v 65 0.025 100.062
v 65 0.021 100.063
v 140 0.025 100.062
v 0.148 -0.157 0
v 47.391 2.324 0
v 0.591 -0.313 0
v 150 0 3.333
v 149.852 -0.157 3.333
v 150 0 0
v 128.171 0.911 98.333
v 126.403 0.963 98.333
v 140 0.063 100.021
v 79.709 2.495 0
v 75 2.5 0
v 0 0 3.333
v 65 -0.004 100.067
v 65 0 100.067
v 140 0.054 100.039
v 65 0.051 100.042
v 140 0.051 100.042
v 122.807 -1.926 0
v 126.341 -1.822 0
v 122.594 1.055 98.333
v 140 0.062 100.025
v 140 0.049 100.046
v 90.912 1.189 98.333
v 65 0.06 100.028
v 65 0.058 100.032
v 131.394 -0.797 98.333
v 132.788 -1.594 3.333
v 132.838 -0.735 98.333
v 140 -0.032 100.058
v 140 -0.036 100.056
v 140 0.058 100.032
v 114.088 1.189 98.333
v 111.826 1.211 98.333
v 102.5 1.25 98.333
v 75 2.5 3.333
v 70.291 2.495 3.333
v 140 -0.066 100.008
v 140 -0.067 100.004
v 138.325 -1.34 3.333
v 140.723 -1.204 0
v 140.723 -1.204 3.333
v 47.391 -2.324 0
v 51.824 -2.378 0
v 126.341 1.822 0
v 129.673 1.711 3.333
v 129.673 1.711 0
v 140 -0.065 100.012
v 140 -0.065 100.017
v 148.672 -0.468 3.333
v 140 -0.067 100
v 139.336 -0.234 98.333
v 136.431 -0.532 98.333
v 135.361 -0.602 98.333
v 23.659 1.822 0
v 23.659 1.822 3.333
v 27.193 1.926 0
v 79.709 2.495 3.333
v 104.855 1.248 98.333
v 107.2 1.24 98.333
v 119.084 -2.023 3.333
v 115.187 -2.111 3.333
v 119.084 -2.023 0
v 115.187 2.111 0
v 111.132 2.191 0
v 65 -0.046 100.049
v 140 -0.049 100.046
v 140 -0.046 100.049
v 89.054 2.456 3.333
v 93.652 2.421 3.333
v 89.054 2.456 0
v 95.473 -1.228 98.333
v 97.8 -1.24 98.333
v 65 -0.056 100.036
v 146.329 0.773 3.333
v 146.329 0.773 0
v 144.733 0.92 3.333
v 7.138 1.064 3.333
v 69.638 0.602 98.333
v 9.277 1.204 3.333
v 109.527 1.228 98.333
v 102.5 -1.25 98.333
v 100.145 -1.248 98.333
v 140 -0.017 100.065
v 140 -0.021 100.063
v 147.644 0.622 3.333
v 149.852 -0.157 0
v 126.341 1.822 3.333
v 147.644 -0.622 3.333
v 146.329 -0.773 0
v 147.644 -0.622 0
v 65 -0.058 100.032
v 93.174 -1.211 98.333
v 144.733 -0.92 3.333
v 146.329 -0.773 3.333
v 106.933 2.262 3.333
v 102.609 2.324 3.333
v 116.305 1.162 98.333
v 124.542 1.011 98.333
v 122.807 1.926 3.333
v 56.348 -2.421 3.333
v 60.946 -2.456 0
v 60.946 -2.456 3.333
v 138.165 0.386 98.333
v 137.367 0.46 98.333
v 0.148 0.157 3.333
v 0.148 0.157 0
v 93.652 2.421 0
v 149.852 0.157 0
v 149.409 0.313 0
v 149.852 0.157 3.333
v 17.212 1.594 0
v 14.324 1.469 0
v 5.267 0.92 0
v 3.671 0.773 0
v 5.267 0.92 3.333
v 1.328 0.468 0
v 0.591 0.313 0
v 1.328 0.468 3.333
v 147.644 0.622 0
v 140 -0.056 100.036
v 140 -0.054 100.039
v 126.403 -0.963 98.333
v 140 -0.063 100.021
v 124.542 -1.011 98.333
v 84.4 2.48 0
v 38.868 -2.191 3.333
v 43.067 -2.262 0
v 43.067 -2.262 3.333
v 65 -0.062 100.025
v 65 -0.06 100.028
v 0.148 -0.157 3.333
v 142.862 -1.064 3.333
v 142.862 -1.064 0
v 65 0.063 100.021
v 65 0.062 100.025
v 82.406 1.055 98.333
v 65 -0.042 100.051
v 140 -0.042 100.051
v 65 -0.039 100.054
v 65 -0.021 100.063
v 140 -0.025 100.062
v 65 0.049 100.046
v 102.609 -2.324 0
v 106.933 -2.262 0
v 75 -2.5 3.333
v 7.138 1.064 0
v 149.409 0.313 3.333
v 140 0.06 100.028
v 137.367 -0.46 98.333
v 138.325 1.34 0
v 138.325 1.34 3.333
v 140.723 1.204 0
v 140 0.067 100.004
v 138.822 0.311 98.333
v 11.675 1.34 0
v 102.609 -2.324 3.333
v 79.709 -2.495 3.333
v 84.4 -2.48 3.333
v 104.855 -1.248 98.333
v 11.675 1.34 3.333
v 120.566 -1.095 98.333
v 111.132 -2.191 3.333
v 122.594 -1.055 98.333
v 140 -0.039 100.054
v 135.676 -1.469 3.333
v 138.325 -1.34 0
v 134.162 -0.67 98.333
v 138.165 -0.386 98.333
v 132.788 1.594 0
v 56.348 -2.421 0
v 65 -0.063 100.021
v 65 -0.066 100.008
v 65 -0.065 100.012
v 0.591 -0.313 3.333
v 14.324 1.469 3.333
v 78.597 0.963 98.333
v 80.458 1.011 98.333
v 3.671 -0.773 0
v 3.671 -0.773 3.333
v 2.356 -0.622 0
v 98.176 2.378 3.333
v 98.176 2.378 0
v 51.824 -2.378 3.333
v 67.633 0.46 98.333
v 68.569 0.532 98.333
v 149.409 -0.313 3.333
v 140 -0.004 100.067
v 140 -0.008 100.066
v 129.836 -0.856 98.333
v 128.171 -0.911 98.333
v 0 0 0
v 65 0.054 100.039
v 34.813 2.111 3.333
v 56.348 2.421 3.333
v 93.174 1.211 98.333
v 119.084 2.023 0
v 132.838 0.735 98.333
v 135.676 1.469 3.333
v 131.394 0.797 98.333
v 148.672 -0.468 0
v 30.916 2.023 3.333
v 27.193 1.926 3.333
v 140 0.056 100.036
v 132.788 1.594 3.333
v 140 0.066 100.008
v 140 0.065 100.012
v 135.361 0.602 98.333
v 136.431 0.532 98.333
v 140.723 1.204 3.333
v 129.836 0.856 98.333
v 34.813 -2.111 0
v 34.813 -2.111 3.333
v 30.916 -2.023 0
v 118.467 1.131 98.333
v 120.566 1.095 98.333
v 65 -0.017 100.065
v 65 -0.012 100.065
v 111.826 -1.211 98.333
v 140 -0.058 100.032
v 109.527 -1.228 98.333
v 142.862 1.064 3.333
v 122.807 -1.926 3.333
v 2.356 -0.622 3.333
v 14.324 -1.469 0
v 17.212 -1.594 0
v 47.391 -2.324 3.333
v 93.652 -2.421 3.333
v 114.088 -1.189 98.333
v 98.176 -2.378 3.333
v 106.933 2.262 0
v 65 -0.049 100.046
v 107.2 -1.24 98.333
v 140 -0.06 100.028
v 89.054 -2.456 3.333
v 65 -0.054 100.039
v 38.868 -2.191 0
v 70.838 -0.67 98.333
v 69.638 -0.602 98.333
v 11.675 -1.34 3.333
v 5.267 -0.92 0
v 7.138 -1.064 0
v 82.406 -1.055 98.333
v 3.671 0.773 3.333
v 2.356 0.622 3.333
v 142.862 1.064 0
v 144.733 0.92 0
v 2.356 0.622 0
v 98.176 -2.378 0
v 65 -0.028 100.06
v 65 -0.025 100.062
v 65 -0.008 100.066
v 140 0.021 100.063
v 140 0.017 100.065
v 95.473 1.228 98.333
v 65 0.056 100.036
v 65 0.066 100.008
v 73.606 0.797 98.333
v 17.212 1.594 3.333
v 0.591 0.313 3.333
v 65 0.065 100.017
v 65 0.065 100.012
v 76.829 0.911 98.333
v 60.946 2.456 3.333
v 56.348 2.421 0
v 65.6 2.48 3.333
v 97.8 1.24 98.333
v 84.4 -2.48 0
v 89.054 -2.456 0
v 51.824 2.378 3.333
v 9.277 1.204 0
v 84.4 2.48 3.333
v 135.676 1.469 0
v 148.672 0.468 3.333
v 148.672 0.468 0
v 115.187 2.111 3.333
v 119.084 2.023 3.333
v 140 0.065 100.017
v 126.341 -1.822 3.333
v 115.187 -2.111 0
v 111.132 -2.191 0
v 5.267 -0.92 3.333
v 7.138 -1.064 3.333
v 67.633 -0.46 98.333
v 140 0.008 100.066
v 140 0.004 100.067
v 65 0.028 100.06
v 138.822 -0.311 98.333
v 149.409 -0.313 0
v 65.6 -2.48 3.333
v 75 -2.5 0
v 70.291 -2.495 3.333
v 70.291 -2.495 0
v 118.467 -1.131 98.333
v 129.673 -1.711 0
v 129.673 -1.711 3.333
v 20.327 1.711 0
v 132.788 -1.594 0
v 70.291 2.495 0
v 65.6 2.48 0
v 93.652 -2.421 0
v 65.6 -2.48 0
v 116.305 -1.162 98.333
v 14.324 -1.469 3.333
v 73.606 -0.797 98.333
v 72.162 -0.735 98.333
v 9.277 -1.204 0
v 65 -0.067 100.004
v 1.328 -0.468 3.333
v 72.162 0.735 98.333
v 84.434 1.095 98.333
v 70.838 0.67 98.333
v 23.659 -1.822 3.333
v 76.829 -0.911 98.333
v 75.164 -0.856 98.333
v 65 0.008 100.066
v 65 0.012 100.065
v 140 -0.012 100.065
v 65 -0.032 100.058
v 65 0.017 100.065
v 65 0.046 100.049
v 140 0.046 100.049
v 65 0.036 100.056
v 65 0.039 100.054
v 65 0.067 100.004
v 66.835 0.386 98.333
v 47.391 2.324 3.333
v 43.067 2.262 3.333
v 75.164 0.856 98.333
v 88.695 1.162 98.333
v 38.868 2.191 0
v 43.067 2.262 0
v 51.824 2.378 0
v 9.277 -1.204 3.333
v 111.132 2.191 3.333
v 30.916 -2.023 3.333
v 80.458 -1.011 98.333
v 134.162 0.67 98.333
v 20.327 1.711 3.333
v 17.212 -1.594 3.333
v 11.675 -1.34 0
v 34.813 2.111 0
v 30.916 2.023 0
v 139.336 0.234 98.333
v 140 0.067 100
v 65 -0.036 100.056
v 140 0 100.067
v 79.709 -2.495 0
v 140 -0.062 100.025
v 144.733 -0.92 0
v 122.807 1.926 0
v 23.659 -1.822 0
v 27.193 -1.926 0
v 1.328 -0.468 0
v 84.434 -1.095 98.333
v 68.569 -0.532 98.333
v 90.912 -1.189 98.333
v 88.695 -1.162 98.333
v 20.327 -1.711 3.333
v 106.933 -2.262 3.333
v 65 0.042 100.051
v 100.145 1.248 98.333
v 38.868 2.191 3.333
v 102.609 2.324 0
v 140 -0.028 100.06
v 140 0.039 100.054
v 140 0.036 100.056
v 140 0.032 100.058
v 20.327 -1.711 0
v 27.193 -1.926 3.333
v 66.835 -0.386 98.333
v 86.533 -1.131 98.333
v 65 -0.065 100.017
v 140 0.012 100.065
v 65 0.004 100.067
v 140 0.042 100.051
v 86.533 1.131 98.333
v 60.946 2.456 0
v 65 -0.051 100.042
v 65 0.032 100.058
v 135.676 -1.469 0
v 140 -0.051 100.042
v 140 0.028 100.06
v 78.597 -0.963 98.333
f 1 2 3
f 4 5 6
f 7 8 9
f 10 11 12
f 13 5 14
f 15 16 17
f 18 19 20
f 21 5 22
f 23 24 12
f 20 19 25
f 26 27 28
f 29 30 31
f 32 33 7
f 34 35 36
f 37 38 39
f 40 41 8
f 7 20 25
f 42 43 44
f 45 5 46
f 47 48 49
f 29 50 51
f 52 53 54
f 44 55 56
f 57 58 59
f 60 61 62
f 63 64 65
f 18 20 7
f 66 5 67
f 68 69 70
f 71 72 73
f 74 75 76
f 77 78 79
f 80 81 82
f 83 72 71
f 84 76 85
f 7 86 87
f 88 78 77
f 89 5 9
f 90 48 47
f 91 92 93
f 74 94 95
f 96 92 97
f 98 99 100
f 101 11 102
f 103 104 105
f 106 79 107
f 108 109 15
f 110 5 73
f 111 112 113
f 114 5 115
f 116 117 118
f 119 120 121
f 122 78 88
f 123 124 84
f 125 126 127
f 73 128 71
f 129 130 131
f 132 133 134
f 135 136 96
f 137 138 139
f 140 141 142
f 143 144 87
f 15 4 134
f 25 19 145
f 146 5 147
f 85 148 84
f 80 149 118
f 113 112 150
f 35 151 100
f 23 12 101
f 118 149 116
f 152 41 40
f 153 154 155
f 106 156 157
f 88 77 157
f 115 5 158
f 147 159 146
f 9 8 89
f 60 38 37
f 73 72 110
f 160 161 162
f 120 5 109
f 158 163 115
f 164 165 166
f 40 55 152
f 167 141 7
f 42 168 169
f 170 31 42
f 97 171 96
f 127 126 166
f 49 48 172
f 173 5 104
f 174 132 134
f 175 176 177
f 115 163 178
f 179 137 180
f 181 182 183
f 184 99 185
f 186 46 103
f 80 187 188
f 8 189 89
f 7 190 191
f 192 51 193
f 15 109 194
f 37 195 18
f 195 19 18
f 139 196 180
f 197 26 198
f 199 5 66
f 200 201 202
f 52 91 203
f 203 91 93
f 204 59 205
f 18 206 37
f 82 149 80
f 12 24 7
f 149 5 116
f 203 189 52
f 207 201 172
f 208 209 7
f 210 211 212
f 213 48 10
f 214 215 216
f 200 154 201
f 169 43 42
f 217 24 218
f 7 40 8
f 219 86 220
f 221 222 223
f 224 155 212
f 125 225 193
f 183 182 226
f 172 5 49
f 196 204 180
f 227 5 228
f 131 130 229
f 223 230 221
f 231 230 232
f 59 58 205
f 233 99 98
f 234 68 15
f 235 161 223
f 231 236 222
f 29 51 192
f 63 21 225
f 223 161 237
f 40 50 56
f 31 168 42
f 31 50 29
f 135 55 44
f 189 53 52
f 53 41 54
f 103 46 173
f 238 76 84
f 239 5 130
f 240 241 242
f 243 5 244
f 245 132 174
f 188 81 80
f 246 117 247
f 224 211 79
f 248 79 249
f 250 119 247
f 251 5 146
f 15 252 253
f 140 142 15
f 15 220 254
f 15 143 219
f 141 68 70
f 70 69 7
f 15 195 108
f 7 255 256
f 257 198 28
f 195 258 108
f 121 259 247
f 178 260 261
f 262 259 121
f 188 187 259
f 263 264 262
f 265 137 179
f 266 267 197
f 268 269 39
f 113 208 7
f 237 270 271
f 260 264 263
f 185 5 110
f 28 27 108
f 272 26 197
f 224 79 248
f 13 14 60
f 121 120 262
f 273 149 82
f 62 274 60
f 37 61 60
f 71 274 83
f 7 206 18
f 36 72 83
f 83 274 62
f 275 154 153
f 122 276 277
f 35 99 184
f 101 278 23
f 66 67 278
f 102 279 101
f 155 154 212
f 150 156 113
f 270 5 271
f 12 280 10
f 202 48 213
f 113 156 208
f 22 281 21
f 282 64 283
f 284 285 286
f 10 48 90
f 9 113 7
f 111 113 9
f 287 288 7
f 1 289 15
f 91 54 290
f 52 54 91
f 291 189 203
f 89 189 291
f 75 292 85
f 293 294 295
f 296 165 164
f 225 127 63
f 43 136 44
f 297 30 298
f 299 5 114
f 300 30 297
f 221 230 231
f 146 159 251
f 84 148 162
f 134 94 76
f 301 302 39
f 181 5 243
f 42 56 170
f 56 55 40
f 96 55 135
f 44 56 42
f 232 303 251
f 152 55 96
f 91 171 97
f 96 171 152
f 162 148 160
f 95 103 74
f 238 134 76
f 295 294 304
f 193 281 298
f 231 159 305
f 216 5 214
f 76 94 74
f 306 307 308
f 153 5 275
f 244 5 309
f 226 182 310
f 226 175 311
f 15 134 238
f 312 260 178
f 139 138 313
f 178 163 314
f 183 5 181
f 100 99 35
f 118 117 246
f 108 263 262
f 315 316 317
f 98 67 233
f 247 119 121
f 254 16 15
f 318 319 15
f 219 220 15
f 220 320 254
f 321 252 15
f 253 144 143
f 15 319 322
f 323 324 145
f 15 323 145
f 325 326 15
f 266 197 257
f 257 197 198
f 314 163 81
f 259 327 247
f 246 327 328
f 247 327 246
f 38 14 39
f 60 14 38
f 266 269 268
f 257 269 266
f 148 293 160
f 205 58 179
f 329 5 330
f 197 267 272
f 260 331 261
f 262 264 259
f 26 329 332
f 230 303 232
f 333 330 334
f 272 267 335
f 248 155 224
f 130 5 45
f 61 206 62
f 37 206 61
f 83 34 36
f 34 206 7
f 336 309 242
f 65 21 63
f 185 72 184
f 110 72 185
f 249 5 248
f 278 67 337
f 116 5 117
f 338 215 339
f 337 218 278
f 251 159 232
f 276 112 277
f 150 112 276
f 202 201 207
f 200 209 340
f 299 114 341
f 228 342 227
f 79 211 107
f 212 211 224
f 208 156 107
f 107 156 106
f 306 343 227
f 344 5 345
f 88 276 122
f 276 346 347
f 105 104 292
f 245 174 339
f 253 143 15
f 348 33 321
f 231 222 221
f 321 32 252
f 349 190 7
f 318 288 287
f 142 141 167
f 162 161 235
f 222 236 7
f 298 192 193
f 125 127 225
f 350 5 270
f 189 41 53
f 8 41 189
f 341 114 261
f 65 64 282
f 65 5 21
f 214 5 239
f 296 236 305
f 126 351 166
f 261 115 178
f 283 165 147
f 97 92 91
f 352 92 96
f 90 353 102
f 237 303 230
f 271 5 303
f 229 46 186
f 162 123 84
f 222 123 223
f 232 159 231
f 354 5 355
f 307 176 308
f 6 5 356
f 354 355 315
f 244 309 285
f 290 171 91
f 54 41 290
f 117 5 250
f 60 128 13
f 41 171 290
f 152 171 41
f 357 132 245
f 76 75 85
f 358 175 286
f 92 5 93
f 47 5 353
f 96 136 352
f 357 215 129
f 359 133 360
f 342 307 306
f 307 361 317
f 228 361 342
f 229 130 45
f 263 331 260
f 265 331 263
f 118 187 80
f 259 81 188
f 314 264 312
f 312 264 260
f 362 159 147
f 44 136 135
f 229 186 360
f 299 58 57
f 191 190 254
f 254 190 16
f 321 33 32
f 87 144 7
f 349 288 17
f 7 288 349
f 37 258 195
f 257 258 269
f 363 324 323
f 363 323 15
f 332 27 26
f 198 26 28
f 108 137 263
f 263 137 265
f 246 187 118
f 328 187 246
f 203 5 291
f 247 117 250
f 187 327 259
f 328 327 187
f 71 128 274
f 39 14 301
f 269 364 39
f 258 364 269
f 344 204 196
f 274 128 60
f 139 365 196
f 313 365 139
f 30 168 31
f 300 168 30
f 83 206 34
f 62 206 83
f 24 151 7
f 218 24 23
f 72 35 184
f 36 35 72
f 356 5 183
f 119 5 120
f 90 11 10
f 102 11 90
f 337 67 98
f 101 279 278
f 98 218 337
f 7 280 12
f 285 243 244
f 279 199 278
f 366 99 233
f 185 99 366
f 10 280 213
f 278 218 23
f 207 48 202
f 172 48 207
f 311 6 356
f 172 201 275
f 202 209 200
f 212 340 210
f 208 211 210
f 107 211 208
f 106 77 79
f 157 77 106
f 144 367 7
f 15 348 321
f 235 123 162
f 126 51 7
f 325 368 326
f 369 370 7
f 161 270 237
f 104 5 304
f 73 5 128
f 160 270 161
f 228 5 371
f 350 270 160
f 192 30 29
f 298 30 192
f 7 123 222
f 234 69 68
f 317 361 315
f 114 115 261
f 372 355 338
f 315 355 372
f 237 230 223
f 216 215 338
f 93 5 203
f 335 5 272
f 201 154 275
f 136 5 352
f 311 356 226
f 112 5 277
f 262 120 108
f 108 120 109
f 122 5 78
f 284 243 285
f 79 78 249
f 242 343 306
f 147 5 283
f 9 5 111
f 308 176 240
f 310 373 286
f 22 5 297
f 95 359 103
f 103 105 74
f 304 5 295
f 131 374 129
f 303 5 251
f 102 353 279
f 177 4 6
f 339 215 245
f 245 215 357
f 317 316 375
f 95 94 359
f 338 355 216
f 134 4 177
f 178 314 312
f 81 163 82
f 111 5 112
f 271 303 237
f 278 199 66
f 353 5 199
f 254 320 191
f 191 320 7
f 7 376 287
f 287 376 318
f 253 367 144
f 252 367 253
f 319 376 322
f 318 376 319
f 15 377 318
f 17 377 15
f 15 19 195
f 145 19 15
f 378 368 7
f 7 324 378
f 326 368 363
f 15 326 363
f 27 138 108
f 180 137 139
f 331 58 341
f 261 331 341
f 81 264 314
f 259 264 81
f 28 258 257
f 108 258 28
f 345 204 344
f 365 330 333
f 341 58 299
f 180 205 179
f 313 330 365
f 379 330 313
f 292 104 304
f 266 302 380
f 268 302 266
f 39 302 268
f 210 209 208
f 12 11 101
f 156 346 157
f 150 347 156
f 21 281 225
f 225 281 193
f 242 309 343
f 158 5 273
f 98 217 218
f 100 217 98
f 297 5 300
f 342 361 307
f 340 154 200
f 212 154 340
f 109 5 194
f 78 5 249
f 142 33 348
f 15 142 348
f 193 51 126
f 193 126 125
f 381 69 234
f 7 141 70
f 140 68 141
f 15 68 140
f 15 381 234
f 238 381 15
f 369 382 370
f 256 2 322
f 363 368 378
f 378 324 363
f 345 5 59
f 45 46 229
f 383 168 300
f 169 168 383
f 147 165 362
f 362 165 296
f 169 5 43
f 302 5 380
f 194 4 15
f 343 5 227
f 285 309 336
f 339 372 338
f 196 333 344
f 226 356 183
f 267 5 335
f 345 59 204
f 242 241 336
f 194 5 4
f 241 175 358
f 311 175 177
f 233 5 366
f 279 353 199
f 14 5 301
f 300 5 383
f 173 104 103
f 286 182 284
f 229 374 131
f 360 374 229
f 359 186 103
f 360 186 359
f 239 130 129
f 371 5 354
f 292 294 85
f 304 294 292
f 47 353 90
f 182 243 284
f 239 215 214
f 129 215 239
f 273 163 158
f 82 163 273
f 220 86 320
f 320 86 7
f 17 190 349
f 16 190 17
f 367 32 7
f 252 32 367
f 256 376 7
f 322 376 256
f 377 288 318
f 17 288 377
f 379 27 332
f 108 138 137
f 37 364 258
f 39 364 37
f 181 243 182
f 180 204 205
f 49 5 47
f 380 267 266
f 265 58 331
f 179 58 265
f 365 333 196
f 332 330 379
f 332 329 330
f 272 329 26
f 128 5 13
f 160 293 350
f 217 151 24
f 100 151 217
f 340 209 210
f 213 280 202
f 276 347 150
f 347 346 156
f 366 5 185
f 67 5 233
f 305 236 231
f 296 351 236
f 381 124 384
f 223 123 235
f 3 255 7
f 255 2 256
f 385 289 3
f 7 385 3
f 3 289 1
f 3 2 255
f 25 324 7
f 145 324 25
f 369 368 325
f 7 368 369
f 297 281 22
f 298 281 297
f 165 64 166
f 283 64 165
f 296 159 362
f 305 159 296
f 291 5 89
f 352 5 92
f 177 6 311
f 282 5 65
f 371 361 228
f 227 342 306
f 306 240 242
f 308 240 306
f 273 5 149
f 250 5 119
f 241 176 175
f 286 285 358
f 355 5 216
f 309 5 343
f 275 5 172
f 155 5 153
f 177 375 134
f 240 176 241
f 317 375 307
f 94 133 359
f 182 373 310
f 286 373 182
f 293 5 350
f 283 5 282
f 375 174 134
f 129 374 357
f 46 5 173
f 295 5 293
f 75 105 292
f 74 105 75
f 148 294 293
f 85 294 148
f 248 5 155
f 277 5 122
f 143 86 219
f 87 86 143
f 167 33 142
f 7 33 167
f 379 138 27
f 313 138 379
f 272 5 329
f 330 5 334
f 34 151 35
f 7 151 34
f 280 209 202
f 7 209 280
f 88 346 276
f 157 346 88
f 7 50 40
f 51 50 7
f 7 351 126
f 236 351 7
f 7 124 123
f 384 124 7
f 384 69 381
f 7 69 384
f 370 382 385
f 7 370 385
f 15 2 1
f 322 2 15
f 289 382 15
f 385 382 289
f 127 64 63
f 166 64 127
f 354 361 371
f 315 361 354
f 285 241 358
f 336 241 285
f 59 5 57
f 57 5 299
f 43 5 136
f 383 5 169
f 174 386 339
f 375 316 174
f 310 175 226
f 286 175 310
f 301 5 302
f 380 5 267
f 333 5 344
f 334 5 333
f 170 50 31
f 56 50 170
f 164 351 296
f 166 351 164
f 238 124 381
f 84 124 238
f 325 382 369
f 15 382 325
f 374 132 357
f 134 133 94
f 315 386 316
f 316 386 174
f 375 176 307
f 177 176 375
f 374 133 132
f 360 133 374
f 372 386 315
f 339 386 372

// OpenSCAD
/*
MIT License

Copyright (c) 1019 Jose D. Saura

Permission is hereby granted, free of charge, to any person obtaining a copy
of this software and associated documentation files (the "Software"), to deal
in the Software without restriction, including without limitation the rights
to use, copy, modify, merge, publish, distribute, sublicense, and/or sell
copies of the Software, and to permit persons to whom the Software is
furnished to do so, subject to the following conditions:

The above copyright notice and this permission notice shall be included in all
copies or substantial portions of the Software.

THE SOFTWARE IS PROVIDED "AS IS", WITHOUT WARRANTY OF ANY KIND, EXPRESS OR
IMPLIED, INCLUDING BUT NOT LIMITED TO THE WARRANTIES OF MERCHANTABILITY,
FITNESS FOR A PARTICULAR PURPOSE AND NONINFRINGEMENT. IN NO EVENT SHALL THE
AUTHORS OR COPYRIGHT HOLDERS BE LIABLE FOR ANY CLAIM, DAMAGES OR OTHER
LIABILITY, WHETHER IN AN ACTION OF CONTRACT, TORT OR OTHERWISE, ARISING FROM,
OUT OF OR IN CONNECTION WITH THE SOFTWARE OR THE USE OR OTHER DEALINGS IN THE
SOFTWARE.
*/

// 
// More about fins:
//  https://www.nakka-rocketry.net/fins.html 

module fin_delta_clipped(h, l, base_width, b=0) {
    
    t= base_width/l;
    
    hull() 
    {
        
        linear_extrude(100*t)
            translate([l/2,0, 0])
               scale([1, t]) circle(r=l/2);
        
        #translate([0,0, h*0.98])
        linear_extrude(10*t)
            translate([l*.75-b,0, 33])
               scale([1, t]) circle(r=l/4);
        
        #translate([l/2-b, 0, h])
            rotate([0,90,0])
                cylinder(l/2, 2*t, 2*t);
        
    }
    
}


fin_delta_clipped(h=100, l=150, base_width=5, b=10, $fn=100);
